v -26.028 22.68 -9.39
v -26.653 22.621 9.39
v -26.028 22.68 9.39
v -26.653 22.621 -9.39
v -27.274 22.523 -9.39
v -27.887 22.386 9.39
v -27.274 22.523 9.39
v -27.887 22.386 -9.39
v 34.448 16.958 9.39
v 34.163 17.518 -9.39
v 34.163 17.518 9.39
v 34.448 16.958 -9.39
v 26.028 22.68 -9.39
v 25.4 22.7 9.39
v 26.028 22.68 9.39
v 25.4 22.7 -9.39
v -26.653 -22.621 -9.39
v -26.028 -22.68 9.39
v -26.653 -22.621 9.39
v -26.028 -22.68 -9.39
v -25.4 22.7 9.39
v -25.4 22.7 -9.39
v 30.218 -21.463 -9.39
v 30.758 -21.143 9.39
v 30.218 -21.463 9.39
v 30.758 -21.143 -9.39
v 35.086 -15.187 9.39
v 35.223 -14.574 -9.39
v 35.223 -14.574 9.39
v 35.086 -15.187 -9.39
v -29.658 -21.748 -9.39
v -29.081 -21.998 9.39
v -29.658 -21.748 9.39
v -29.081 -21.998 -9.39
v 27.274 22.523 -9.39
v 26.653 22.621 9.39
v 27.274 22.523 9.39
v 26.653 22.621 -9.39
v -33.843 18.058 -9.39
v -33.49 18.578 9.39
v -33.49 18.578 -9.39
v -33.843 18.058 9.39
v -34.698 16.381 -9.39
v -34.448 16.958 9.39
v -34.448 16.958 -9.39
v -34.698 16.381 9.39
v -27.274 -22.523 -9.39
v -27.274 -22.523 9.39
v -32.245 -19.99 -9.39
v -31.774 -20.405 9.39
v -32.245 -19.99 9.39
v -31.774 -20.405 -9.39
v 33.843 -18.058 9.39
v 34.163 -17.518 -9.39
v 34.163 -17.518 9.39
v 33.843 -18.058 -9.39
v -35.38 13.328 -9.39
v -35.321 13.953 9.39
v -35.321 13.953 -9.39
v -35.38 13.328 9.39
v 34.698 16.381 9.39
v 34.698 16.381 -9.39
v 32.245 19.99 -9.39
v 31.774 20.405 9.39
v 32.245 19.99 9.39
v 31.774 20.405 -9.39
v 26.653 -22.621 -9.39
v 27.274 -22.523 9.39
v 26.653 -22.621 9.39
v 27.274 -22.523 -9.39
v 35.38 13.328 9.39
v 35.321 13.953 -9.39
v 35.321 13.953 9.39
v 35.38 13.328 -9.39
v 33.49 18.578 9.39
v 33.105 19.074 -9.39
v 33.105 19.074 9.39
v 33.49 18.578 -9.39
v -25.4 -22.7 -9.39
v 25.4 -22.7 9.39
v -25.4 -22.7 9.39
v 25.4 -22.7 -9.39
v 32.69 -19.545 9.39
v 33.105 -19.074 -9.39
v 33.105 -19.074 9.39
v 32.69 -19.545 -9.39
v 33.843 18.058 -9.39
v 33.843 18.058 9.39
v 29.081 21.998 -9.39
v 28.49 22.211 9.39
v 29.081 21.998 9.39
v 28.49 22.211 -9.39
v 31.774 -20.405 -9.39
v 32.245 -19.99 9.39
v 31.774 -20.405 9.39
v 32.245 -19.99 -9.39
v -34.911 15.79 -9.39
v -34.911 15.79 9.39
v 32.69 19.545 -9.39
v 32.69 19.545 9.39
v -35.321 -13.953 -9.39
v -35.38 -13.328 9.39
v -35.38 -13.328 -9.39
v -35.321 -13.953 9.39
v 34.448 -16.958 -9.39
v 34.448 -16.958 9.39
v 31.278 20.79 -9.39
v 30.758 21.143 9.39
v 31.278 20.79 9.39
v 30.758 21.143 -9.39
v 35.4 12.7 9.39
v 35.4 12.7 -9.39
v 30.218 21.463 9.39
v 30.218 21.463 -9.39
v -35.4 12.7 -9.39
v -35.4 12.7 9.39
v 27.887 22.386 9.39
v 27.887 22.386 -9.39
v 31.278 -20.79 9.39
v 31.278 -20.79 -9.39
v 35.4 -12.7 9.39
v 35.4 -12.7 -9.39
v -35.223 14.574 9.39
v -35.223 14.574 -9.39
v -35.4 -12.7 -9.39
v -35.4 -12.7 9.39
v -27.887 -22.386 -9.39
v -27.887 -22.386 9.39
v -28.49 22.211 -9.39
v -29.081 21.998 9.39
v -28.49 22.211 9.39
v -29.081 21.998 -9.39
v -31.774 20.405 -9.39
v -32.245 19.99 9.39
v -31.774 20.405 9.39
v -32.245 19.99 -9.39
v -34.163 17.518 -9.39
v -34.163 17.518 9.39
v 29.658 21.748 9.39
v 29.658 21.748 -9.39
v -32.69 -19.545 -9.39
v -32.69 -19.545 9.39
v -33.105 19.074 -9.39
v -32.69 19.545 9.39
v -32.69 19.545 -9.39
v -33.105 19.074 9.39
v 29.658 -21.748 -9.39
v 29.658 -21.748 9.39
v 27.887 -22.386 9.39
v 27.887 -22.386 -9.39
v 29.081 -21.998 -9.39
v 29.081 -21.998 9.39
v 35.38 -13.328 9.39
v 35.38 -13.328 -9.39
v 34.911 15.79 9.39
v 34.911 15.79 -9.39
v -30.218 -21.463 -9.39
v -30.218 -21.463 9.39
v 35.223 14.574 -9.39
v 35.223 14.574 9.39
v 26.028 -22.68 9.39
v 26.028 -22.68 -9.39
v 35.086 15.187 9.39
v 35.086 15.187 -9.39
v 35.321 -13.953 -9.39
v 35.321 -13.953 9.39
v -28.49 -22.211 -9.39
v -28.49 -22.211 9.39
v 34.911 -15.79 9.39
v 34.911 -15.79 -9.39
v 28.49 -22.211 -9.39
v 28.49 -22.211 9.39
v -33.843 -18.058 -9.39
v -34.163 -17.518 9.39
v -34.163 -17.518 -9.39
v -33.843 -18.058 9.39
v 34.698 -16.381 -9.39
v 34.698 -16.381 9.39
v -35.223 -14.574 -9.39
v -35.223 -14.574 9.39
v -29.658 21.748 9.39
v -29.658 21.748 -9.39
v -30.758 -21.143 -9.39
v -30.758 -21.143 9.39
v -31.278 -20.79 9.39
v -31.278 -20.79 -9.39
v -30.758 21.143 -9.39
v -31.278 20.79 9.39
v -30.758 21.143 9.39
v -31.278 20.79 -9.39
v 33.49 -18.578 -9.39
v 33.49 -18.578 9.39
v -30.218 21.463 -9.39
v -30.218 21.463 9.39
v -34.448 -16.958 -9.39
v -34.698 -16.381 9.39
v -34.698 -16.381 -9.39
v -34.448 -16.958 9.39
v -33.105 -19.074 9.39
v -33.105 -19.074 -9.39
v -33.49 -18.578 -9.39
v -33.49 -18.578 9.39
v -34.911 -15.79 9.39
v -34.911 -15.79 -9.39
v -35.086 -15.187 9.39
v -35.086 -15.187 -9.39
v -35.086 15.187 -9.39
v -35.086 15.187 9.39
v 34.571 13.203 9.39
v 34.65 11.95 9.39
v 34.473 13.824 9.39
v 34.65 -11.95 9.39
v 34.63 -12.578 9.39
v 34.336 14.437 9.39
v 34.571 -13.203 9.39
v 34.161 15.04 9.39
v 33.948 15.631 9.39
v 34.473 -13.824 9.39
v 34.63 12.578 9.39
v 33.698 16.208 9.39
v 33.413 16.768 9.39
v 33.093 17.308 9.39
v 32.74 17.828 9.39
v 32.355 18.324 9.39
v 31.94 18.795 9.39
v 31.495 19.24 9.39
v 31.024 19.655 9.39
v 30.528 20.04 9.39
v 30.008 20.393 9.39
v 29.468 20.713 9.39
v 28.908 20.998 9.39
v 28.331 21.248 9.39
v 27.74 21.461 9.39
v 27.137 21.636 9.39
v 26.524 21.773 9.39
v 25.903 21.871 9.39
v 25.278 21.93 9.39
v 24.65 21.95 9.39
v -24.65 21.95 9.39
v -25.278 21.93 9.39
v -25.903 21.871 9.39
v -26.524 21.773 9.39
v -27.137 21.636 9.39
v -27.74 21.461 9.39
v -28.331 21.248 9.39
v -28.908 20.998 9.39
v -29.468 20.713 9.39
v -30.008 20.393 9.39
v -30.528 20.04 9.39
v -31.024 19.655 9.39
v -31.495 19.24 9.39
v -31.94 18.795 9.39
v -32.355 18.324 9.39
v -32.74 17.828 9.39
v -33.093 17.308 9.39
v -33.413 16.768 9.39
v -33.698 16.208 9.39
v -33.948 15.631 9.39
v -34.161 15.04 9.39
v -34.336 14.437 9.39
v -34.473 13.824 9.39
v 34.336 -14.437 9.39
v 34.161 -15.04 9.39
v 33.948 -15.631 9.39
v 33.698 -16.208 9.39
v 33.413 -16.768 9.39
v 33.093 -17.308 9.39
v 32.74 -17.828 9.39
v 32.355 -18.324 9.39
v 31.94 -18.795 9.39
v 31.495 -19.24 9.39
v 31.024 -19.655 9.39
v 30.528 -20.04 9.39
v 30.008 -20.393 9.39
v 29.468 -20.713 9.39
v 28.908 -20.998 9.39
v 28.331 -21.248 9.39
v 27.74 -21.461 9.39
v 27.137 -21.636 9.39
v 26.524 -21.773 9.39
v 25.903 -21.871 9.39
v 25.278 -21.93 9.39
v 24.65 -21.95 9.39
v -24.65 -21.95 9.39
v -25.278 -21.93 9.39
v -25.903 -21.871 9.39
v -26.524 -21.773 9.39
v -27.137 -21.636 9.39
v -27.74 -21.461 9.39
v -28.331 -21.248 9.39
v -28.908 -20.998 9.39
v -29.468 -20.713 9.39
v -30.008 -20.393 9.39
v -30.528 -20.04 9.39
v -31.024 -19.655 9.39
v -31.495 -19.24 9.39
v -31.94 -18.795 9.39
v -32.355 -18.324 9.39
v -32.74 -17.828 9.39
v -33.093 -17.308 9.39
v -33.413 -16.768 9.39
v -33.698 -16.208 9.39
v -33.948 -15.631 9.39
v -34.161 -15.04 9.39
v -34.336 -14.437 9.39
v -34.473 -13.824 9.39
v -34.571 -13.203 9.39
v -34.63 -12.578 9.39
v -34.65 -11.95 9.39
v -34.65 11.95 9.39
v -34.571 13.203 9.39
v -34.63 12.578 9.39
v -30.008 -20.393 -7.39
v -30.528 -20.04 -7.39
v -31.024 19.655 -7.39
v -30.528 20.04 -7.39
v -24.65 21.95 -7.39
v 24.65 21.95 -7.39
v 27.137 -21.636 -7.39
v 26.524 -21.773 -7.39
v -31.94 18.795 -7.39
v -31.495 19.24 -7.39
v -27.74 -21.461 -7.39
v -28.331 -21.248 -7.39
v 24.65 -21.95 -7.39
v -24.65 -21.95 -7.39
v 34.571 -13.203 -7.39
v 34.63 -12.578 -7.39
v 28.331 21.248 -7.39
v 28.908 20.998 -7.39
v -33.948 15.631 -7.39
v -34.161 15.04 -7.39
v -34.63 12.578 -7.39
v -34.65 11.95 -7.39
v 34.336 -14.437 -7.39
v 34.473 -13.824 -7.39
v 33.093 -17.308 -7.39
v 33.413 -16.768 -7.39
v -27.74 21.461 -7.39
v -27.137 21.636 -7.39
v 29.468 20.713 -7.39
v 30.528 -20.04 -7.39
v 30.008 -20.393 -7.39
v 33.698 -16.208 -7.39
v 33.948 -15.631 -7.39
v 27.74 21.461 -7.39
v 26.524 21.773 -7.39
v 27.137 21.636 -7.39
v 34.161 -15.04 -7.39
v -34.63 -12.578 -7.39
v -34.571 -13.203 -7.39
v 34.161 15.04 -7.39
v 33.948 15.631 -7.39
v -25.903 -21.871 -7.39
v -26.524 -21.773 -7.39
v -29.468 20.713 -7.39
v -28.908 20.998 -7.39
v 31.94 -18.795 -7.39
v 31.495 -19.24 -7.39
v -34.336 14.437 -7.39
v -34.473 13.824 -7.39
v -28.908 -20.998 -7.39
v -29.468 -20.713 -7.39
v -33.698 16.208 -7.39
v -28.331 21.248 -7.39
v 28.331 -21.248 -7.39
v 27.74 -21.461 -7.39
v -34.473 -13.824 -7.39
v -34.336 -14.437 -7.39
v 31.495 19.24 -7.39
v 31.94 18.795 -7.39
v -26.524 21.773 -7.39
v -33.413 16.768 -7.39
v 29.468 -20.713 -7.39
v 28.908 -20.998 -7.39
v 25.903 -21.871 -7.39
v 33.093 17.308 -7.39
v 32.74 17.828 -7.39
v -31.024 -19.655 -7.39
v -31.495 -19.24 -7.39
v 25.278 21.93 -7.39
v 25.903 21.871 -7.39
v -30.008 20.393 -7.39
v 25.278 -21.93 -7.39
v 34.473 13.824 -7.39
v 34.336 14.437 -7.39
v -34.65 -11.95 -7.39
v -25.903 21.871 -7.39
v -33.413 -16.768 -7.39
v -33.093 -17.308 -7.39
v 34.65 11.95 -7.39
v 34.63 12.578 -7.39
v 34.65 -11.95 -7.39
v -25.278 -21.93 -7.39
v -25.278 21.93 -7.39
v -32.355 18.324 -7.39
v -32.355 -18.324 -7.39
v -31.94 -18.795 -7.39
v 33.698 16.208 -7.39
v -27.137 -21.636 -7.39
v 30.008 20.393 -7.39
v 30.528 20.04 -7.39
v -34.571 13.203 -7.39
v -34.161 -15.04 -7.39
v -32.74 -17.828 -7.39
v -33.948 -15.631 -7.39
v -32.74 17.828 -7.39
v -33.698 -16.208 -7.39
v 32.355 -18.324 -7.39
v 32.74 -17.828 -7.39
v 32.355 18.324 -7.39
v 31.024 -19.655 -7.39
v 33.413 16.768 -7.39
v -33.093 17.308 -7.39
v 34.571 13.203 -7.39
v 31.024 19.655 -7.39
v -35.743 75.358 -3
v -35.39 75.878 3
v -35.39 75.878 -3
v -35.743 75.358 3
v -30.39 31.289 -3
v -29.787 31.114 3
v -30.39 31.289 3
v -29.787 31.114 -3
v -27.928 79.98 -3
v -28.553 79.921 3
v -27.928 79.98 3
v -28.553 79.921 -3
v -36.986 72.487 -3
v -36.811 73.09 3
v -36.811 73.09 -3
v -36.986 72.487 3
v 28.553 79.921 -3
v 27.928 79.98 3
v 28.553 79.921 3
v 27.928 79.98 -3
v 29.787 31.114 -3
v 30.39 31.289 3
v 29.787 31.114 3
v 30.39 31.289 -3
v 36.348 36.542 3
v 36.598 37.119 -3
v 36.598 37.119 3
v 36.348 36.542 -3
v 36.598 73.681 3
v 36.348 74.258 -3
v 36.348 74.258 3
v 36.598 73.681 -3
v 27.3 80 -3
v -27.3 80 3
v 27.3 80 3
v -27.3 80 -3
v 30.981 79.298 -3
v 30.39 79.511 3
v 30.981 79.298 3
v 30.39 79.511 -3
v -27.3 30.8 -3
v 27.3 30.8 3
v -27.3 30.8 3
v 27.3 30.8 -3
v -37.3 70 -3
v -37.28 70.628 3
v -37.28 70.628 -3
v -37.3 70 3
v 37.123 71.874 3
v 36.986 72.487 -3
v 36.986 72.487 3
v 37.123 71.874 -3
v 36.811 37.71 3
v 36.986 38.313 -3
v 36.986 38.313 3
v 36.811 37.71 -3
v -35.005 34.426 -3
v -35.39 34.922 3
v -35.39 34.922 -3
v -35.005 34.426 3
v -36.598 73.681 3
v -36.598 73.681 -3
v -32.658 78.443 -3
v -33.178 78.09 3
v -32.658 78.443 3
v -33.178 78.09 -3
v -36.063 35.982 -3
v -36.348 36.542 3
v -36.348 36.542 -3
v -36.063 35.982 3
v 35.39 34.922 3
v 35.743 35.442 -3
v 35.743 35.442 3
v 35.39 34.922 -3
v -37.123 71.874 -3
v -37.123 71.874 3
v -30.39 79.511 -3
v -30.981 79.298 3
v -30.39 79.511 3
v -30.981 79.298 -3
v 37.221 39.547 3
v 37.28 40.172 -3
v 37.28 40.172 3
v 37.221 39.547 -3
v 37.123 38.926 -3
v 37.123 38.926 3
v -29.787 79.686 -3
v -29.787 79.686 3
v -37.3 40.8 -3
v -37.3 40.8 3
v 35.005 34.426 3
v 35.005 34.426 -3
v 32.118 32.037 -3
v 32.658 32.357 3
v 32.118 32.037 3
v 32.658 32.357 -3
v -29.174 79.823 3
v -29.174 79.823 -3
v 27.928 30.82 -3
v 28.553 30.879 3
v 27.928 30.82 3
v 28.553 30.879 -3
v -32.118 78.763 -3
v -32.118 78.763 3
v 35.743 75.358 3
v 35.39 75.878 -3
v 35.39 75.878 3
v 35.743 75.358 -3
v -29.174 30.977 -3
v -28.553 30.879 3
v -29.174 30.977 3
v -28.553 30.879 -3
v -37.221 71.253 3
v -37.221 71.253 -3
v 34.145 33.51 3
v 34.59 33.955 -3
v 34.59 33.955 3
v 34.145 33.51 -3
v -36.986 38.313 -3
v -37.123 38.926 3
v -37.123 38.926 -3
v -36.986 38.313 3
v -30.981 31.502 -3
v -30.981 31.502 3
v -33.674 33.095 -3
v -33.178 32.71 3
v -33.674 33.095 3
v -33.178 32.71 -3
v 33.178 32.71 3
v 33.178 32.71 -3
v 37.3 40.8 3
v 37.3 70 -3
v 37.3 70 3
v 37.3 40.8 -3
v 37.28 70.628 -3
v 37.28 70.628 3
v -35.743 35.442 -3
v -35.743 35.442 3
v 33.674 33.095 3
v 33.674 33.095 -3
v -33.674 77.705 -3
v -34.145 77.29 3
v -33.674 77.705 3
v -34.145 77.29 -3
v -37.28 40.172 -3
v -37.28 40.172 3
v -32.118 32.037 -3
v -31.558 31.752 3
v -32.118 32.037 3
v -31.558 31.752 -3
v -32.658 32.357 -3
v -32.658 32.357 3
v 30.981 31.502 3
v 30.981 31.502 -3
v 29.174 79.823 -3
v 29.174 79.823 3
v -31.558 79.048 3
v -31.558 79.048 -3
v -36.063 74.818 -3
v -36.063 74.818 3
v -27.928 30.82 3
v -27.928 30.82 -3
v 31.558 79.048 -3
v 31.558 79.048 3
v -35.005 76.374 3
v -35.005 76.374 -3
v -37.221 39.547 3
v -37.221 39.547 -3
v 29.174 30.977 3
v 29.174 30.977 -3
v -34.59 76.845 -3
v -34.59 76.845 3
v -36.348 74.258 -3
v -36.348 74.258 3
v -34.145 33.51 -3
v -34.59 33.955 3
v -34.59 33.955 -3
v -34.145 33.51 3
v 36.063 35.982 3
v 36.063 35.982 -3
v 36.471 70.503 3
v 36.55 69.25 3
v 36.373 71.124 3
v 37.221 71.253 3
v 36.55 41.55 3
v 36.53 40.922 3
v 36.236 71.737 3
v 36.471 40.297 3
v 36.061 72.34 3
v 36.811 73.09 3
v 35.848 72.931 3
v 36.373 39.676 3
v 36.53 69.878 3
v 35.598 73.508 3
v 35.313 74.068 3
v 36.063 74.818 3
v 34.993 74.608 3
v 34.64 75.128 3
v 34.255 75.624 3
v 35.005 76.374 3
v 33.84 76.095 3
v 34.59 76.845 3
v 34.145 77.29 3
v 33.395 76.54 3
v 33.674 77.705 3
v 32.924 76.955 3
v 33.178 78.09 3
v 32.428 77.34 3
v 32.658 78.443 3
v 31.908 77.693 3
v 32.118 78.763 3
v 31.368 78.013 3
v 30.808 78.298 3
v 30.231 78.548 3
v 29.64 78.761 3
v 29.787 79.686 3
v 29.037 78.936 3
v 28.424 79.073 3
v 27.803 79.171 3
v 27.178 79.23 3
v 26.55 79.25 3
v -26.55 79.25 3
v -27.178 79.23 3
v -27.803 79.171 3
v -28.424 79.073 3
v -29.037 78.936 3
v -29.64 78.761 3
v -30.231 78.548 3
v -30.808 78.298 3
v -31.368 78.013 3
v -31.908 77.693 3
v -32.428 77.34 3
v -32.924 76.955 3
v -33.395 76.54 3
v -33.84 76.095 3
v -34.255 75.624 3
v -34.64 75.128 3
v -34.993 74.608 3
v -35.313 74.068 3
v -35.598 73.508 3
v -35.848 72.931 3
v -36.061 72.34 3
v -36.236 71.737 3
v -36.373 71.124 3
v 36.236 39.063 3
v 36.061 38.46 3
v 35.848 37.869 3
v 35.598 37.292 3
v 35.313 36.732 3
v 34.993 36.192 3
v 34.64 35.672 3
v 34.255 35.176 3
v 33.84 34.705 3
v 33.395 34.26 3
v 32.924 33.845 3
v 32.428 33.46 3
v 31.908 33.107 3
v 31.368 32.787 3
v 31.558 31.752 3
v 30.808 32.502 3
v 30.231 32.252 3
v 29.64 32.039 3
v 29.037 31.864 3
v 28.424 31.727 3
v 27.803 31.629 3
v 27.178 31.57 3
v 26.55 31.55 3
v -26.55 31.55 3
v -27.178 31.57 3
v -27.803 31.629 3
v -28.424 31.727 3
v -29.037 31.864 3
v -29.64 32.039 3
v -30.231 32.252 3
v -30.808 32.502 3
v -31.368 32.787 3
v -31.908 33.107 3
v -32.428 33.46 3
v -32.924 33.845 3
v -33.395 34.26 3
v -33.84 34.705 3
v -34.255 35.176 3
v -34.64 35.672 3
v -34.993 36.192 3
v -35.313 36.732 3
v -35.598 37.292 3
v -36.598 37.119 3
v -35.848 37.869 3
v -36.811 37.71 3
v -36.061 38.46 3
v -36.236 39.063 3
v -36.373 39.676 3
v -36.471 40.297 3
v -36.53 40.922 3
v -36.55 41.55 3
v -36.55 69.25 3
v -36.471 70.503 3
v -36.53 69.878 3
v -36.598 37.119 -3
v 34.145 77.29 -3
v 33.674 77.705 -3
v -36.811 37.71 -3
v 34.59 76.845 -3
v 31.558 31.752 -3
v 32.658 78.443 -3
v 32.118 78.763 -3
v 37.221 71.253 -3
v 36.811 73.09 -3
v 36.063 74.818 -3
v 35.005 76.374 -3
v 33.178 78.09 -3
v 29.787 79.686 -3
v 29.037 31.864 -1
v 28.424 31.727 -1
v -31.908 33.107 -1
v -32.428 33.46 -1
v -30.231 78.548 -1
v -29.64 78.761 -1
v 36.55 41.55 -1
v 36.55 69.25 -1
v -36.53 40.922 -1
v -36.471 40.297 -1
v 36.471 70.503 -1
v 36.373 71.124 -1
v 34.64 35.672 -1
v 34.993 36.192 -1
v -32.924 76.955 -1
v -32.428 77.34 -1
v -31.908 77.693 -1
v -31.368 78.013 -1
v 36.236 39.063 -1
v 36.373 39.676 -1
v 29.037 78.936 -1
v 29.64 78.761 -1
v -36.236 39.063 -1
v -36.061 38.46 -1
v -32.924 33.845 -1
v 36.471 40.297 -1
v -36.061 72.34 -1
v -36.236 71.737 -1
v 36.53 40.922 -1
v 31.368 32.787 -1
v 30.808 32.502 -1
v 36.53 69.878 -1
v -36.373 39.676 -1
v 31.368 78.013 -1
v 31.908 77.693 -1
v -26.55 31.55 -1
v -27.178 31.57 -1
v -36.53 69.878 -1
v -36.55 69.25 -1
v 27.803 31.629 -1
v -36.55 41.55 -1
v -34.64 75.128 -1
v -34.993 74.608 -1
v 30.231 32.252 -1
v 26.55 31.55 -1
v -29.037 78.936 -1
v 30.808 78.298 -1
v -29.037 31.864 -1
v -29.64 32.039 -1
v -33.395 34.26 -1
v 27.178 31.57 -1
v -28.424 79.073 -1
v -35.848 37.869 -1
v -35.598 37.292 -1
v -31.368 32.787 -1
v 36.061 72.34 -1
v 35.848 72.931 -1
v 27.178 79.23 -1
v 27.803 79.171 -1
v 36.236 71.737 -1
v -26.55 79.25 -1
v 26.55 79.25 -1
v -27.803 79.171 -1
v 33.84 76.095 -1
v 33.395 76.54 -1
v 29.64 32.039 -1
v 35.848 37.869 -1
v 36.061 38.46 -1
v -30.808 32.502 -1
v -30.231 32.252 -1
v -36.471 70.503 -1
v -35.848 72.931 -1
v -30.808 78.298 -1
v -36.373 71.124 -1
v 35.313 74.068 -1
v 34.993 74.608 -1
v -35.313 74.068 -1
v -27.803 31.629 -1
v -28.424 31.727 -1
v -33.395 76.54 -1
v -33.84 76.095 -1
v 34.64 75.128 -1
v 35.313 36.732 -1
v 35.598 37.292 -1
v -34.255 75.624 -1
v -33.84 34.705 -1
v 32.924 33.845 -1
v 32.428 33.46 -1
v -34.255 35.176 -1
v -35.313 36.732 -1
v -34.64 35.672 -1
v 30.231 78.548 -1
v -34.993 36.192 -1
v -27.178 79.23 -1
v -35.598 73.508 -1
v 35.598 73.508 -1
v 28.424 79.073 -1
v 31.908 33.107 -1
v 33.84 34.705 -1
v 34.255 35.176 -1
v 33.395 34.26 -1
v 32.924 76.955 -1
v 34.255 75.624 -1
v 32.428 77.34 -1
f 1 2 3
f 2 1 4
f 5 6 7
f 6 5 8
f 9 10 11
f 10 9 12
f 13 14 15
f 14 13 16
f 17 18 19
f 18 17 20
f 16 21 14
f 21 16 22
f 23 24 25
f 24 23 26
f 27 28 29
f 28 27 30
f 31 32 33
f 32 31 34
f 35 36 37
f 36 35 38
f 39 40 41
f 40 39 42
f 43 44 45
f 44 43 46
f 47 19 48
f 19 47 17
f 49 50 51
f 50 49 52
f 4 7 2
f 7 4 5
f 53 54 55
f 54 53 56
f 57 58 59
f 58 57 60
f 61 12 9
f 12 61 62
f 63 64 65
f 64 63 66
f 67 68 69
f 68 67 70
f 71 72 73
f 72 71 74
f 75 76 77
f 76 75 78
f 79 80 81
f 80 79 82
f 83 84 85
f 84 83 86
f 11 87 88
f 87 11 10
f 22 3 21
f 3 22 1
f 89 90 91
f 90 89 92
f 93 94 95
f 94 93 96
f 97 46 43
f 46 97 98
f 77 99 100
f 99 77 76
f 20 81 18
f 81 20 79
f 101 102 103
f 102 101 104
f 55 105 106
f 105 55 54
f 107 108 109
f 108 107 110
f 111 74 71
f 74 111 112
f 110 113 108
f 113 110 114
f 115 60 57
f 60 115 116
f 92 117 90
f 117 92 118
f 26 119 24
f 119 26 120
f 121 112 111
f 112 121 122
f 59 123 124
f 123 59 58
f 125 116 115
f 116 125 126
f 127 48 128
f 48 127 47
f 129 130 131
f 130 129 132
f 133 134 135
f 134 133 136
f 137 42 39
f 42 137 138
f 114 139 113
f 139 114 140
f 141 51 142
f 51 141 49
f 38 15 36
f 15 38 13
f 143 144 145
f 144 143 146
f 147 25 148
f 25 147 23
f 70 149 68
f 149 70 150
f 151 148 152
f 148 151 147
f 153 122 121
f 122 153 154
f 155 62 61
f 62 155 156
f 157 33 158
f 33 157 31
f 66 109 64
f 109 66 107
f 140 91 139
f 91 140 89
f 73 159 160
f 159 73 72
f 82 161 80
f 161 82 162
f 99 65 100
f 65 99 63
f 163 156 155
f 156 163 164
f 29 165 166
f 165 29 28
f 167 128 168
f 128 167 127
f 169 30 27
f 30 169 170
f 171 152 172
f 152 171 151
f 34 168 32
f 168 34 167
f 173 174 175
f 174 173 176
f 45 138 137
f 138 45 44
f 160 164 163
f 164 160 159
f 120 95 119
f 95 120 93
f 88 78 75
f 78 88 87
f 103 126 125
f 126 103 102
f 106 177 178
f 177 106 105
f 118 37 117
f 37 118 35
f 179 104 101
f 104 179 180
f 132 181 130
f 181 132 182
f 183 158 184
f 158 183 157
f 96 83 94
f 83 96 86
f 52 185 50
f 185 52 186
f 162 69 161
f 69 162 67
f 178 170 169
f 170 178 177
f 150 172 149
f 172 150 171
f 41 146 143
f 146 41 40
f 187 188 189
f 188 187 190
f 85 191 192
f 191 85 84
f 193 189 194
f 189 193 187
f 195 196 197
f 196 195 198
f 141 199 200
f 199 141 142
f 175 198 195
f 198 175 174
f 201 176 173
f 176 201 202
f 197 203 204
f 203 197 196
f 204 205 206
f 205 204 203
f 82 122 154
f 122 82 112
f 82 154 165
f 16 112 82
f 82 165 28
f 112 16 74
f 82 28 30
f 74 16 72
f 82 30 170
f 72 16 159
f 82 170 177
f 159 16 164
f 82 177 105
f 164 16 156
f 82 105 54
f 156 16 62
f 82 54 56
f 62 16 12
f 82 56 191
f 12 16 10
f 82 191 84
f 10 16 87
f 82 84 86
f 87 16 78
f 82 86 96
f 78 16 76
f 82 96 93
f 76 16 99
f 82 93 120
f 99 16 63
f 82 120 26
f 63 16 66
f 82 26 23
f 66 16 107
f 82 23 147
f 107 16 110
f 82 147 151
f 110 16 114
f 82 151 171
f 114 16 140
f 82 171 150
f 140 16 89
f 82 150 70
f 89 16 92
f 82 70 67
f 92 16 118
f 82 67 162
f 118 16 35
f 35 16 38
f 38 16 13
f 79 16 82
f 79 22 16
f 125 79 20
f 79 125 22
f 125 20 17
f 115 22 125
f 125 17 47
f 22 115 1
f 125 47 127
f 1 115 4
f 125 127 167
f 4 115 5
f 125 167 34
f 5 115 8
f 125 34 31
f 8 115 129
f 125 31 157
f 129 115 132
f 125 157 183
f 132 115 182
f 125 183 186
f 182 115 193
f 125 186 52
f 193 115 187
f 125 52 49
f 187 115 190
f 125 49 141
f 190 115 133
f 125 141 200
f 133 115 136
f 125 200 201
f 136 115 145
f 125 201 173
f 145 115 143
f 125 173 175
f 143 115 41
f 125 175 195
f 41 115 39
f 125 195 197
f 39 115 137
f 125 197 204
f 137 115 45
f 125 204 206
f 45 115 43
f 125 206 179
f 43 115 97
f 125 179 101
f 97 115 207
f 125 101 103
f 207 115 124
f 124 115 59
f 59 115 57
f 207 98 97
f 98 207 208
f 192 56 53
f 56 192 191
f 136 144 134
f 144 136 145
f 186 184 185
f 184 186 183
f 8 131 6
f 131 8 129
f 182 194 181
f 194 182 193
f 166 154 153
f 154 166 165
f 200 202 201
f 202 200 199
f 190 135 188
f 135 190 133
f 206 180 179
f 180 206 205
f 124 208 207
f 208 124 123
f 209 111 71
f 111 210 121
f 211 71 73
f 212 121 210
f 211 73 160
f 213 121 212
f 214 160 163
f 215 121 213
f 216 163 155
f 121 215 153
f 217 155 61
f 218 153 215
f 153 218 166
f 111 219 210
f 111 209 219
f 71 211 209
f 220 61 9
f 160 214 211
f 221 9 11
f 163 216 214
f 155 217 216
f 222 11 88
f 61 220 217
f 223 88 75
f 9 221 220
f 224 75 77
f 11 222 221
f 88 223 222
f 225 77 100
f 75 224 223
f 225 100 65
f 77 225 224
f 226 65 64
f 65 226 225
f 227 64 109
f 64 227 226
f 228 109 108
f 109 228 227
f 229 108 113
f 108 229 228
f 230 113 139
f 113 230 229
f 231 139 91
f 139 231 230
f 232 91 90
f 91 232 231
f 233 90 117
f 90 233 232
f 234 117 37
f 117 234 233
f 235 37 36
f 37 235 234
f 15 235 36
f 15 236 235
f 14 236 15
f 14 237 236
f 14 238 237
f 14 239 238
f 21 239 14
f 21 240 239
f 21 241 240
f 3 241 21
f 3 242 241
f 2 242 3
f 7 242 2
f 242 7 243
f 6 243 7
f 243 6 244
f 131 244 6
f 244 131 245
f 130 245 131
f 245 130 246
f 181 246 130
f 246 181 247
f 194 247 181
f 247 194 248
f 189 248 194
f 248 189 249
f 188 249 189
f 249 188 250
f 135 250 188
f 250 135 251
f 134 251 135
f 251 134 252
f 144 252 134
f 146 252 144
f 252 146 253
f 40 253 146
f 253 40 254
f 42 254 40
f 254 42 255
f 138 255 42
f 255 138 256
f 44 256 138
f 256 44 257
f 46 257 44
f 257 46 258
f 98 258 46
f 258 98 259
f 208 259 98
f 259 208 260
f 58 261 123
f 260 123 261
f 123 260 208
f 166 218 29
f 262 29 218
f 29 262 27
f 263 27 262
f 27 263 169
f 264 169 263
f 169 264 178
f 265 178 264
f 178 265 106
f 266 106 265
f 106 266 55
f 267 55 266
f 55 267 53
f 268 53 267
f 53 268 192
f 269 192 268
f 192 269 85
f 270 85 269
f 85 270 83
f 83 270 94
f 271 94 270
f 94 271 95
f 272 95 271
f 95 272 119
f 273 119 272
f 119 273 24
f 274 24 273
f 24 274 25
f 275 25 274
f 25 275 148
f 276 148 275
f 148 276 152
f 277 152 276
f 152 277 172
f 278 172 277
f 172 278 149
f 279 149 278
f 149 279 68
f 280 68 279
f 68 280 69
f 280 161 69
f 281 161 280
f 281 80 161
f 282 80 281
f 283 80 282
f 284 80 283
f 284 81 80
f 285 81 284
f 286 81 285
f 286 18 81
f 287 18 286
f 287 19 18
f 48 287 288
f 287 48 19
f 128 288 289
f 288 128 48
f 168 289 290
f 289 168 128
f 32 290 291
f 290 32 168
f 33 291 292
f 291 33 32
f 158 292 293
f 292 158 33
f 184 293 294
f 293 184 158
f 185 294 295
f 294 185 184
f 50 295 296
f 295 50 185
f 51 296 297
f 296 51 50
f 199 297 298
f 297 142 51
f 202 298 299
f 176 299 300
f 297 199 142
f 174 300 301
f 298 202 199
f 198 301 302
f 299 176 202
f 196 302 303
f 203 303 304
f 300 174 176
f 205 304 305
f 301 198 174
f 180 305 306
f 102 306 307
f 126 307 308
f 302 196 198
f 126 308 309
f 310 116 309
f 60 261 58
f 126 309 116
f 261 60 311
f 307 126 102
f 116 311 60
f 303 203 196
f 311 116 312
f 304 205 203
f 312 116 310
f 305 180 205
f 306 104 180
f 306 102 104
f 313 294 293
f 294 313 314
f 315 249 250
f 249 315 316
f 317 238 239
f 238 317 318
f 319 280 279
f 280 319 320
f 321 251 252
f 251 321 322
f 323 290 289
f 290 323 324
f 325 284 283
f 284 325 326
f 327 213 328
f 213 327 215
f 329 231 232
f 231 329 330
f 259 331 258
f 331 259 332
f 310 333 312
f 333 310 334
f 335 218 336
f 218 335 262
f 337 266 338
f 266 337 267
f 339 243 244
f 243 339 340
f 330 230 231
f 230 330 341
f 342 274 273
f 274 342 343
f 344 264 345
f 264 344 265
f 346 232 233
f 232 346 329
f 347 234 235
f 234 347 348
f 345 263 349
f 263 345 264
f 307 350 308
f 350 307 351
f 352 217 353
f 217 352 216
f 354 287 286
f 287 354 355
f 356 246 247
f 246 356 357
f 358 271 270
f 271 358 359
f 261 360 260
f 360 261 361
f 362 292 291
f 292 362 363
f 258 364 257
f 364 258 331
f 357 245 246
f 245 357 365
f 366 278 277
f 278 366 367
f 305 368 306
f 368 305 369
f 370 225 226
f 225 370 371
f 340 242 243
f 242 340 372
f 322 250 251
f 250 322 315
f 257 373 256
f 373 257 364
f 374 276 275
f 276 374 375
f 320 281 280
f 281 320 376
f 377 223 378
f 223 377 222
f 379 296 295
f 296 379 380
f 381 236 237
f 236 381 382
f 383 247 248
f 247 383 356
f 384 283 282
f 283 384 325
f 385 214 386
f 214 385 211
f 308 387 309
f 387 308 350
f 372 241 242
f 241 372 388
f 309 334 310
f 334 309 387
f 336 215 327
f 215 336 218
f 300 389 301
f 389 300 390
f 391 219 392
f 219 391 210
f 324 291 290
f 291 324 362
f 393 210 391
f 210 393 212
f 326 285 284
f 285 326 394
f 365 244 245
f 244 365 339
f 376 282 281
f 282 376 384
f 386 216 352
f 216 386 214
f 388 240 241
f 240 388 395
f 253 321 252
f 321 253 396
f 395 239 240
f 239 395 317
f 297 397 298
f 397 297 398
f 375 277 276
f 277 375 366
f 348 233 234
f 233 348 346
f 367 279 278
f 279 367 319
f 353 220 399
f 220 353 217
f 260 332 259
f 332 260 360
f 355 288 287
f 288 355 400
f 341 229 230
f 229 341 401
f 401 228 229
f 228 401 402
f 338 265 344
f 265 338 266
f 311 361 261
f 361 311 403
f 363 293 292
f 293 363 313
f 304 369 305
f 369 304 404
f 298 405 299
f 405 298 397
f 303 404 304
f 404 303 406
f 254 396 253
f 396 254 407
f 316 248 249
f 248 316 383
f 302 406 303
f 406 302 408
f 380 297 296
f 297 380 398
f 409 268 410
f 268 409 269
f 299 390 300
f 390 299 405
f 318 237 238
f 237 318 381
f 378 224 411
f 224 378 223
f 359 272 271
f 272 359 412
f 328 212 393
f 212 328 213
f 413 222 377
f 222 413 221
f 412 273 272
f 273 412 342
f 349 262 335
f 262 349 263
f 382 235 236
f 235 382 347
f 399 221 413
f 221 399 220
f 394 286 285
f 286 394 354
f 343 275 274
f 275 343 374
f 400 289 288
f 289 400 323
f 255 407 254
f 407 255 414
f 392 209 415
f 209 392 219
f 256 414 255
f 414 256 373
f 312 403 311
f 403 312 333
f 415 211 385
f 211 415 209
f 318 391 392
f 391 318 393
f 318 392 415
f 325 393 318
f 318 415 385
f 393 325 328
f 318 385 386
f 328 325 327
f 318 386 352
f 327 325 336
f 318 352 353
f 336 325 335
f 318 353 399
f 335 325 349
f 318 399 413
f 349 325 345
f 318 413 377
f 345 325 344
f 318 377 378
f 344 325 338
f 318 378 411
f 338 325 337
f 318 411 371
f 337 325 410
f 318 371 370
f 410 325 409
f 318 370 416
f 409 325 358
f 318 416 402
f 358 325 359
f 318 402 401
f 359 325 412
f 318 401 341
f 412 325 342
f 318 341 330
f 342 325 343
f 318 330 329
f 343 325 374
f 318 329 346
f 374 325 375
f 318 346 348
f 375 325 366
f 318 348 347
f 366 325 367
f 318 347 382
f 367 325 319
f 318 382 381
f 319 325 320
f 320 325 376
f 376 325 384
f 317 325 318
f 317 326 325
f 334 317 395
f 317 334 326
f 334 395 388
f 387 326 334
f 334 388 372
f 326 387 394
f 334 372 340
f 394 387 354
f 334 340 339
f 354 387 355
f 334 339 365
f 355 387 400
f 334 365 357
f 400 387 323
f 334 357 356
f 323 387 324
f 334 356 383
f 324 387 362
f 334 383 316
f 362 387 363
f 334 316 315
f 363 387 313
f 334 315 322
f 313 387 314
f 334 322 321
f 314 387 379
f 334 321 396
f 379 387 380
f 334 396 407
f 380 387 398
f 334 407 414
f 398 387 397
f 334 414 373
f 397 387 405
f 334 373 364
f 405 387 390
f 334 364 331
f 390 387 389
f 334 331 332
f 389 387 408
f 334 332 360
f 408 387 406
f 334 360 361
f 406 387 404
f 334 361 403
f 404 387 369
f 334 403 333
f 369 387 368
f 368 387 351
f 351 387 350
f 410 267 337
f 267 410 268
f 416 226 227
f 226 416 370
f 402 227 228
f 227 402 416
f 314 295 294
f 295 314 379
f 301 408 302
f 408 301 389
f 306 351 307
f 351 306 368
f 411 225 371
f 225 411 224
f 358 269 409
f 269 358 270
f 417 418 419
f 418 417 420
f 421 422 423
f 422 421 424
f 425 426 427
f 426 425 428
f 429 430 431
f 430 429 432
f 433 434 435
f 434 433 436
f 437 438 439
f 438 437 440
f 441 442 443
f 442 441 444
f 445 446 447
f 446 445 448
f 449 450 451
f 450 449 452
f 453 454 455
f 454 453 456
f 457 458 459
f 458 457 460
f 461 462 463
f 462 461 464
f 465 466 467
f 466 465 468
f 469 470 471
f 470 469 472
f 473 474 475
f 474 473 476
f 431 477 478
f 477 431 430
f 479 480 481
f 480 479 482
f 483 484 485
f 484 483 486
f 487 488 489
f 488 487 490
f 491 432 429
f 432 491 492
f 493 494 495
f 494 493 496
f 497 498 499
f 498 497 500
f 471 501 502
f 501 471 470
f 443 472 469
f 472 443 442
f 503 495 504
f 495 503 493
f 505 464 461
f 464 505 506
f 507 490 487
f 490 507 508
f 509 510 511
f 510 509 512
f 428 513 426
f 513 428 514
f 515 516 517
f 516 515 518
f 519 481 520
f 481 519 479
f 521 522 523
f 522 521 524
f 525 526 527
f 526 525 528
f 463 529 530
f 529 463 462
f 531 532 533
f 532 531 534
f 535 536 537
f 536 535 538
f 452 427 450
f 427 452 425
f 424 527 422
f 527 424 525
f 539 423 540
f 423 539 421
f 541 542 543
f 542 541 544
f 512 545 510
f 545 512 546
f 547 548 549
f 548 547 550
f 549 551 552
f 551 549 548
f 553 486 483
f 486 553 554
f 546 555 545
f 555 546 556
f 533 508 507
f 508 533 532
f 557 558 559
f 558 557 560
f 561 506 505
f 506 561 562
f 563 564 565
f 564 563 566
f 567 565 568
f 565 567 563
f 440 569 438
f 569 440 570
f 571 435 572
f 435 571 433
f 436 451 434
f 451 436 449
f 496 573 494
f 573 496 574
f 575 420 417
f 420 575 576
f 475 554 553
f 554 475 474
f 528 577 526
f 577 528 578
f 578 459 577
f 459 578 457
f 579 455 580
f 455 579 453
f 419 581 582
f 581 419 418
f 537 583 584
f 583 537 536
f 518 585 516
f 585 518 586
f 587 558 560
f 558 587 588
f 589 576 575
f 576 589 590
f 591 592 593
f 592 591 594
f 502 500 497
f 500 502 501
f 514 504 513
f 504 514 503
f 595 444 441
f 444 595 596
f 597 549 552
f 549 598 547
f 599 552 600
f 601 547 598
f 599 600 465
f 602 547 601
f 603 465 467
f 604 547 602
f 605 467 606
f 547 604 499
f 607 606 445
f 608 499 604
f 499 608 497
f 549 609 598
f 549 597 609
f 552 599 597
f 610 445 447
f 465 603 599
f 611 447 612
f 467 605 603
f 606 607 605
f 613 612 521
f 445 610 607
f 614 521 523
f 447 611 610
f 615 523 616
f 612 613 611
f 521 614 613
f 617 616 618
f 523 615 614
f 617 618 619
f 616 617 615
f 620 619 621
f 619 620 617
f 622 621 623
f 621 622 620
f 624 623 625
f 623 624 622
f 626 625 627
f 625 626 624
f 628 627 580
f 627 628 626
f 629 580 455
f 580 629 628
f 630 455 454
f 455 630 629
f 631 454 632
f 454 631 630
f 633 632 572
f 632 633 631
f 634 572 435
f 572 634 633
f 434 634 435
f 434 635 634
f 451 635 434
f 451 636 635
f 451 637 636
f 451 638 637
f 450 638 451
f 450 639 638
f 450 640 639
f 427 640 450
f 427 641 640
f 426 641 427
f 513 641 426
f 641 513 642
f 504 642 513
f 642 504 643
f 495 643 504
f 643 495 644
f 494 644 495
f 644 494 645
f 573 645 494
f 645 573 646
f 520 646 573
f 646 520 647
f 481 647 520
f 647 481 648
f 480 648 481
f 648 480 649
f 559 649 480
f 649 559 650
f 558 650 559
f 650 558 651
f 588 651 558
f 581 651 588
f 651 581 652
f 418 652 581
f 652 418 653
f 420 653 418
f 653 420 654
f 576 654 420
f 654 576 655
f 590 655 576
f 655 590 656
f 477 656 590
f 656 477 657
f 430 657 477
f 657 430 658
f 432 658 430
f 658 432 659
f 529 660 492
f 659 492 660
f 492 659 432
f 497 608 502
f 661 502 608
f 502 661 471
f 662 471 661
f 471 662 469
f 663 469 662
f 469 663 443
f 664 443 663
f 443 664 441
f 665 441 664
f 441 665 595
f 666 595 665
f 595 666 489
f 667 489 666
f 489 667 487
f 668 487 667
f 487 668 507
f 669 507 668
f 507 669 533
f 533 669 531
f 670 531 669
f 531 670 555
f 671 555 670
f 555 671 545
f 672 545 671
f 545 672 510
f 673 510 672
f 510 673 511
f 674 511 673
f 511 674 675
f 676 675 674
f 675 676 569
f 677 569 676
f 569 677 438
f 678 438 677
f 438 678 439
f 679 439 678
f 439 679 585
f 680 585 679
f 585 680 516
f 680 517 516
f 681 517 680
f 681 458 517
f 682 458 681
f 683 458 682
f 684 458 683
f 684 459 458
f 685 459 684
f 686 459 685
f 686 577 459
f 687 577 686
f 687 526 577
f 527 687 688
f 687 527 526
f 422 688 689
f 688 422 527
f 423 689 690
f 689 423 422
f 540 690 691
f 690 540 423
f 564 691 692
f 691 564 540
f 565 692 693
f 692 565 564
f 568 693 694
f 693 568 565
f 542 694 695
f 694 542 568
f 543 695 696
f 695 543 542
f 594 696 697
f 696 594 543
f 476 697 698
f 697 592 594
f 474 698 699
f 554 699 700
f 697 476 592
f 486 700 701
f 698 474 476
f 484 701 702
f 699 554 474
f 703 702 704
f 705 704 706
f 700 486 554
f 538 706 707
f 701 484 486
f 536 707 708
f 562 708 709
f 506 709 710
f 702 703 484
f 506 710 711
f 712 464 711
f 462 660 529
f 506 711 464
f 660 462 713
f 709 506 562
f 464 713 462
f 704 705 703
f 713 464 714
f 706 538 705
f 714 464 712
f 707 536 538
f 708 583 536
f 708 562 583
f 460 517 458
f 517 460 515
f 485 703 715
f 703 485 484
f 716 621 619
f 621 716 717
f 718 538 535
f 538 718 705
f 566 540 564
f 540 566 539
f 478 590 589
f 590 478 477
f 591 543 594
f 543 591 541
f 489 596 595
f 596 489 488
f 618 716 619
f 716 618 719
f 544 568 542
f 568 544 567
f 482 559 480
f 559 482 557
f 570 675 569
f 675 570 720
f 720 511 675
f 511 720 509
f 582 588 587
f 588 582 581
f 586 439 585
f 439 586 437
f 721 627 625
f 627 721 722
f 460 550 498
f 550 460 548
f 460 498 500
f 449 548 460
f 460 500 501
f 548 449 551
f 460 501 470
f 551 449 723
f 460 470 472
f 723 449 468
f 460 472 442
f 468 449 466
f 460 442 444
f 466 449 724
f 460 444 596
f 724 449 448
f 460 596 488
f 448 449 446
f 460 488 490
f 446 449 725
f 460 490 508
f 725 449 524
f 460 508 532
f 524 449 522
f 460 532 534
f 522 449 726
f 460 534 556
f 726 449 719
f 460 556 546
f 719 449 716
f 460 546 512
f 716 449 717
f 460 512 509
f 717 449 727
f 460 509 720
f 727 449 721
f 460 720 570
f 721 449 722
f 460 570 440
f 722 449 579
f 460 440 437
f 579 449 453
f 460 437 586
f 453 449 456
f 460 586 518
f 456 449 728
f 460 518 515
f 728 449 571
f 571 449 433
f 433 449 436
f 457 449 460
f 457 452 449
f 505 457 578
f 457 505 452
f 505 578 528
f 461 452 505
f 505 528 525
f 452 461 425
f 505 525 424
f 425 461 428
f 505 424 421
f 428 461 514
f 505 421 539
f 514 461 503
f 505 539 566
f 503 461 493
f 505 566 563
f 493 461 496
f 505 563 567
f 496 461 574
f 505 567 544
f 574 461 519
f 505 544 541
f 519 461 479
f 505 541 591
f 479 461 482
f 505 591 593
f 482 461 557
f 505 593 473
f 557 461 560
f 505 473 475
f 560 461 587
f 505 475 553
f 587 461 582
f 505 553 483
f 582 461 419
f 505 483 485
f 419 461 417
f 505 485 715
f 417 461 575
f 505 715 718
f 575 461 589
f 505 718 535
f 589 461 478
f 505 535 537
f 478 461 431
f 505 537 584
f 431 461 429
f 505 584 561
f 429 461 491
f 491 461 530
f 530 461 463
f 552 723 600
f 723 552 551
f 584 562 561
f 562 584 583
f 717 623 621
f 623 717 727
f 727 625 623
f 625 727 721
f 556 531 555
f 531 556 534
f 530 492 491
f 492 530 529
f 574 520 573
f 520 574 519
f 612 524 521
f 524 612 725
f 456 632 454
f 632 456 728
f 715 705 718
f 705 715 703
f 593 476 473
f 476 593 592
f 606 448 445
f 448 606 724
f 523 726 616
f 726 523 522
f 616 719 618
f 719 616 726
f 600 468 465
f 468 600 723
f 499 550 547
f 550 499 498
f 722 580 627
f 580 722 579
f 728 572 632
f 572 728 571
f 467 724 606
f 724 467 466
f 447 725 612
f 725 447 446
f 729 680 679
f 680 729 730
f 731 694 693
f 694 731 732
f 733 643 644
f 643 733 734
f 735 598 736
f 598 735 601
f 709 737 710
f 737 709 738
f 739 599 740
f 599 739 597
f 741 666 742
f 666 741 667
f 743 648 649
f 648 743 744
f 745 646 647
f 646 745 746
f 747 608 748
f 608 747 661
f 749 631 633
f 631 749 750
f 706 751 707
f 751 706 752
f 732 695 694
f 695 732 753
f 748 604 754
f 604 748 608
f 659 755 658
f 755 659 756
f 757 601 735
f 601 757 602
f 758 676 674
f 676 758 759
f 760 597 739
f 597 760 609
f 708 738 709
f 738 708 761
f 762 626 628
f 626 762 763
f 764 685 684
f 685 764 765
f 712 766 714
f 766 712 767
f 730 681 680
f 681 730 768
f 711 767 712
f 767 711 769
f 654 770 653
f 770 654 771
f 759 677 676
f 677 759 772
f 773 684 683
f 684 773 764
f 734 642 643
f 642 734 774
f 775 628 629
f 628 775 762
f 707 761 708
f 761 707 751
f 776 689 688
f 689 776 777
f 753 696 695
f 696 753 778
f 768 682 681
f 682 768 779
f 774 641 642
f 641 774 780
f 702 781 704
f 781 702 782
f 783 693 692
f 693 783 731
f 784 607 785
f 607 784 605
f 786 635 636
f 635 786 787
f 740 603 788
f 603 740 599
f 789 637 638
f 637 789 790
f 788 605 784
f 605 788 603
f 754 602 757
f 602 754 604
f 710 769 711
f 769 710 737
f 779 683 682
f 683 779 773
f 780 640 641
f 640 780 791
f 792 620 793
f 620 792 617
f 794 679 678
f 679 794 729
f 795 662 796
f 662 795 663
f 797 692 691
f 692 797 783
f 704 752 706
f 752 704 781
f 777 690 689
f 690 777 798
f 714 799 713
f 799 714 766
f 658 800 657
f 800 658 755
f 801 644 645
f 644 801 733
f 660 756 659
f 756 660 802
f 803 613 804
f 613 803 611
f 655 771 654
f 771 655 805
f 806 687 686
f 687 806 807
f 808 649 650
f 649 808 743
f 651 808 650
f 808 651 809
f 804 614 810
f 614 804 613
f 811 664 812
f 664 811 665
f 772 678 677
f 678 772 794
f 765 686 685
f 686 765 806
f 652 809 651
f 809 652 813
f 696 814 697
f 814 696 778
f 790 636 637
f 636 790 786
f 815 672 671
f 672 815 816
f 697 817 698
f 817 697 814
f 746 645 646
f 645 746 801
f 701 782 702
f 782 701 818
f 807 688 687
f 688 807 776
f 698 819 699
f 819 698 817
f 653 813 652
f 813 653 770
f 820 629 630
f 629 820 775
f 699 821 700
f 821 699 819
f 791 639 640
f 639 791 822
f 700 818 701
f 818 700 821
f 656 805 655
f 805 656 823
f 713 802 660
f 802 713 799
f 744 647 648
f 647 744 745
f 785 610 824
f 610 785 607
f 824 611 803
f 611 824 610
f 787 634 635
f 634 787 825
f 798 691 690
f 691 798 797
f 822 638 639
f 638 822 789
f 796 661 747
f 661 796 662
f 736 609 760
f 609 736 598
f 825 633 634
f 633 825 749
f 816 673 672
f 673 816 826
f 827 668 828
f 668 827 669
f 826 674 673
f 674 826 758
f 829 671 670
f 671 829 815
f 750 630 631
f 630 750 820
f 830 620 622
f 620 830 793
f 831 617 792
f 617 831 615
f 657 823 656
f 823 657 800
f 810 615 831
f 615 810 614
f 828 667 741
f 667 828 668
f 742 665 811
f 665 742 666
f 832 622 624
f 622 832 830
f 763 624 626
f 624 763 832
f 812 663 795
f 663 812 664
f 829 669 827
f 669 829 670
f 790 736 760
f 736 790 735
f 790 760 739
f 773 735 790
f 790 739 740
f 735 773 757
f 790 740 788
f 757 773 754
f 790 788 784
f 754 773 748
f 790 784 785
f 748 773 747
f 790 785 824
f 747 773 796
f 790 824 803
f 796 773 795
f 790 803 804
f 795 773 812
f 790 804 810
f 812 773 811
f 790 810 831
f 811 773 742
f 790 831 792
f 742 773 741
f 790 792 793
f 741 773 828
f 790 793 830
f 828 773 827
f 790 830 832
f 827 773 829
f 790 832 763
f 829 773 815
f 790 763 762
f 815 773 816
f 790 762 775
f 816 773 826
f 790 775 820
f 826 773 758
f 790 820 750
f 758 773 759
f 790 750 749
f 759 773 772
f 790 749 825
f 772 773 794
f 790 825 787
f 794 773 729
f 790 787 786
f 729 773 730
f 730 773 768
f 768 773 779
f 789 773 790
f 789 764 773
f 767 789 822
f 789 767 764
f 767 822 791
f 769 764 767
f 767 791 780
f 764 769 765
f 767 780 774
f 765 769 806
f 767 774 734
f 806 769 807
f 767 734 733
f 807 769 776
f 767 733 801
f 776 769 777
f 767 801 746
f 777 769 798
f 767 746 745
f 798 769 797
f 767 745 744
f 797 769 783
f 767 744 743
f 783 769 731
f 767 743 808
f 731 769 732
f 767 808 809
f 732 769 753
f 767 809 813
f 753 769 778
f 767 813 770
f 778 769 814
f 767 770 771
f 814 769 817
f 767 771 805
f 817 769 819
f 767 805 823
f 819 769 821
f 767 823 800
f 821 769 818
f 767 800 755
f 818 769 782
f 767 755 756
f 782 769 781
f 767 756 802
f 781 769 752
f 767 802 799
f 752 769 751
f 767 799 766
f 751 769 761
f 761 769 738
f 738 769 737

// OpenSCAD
// Started with `Mini Rounded Box v.1` by Hermes Alvarado <hermesalvarado@gmail.com>
$fn=100;

width = 2 * 25.4;
length = 1 * 25.4;
height = 0.7 * 25.4;
lidheight = 5;

thickness = 1.5;
bottom = 2;

radius = 10;
tolerance = 0.4;

module rounded_box(l,w,h, r) {
    difference() {
        minkowski() {
            cube([l, w, h], center=true);
            cylinder(r=r,h=1, center=true);
        }
    }
}

module open_rounded_box(l,w,h, r, wall,bot) {
    difference() {
        rounded_box(l, w, h, r);
        translate([0,0,bot]) rounded_box(l-wall, w-wall, h, r);
    }
}

module base() {
    open_rounded_box(width, length, height, radius, thickness, bottom);
}

module lid() {
    extra = thickness*2+tolerance*2;
    open_rounded_box(width+extra, length+extra, lidheight, radius, thickness, bottom);
}

module lidded_box() {
    base();
    translate([0, length + radius * 3, 0]) lid();
}

lidded_box();
